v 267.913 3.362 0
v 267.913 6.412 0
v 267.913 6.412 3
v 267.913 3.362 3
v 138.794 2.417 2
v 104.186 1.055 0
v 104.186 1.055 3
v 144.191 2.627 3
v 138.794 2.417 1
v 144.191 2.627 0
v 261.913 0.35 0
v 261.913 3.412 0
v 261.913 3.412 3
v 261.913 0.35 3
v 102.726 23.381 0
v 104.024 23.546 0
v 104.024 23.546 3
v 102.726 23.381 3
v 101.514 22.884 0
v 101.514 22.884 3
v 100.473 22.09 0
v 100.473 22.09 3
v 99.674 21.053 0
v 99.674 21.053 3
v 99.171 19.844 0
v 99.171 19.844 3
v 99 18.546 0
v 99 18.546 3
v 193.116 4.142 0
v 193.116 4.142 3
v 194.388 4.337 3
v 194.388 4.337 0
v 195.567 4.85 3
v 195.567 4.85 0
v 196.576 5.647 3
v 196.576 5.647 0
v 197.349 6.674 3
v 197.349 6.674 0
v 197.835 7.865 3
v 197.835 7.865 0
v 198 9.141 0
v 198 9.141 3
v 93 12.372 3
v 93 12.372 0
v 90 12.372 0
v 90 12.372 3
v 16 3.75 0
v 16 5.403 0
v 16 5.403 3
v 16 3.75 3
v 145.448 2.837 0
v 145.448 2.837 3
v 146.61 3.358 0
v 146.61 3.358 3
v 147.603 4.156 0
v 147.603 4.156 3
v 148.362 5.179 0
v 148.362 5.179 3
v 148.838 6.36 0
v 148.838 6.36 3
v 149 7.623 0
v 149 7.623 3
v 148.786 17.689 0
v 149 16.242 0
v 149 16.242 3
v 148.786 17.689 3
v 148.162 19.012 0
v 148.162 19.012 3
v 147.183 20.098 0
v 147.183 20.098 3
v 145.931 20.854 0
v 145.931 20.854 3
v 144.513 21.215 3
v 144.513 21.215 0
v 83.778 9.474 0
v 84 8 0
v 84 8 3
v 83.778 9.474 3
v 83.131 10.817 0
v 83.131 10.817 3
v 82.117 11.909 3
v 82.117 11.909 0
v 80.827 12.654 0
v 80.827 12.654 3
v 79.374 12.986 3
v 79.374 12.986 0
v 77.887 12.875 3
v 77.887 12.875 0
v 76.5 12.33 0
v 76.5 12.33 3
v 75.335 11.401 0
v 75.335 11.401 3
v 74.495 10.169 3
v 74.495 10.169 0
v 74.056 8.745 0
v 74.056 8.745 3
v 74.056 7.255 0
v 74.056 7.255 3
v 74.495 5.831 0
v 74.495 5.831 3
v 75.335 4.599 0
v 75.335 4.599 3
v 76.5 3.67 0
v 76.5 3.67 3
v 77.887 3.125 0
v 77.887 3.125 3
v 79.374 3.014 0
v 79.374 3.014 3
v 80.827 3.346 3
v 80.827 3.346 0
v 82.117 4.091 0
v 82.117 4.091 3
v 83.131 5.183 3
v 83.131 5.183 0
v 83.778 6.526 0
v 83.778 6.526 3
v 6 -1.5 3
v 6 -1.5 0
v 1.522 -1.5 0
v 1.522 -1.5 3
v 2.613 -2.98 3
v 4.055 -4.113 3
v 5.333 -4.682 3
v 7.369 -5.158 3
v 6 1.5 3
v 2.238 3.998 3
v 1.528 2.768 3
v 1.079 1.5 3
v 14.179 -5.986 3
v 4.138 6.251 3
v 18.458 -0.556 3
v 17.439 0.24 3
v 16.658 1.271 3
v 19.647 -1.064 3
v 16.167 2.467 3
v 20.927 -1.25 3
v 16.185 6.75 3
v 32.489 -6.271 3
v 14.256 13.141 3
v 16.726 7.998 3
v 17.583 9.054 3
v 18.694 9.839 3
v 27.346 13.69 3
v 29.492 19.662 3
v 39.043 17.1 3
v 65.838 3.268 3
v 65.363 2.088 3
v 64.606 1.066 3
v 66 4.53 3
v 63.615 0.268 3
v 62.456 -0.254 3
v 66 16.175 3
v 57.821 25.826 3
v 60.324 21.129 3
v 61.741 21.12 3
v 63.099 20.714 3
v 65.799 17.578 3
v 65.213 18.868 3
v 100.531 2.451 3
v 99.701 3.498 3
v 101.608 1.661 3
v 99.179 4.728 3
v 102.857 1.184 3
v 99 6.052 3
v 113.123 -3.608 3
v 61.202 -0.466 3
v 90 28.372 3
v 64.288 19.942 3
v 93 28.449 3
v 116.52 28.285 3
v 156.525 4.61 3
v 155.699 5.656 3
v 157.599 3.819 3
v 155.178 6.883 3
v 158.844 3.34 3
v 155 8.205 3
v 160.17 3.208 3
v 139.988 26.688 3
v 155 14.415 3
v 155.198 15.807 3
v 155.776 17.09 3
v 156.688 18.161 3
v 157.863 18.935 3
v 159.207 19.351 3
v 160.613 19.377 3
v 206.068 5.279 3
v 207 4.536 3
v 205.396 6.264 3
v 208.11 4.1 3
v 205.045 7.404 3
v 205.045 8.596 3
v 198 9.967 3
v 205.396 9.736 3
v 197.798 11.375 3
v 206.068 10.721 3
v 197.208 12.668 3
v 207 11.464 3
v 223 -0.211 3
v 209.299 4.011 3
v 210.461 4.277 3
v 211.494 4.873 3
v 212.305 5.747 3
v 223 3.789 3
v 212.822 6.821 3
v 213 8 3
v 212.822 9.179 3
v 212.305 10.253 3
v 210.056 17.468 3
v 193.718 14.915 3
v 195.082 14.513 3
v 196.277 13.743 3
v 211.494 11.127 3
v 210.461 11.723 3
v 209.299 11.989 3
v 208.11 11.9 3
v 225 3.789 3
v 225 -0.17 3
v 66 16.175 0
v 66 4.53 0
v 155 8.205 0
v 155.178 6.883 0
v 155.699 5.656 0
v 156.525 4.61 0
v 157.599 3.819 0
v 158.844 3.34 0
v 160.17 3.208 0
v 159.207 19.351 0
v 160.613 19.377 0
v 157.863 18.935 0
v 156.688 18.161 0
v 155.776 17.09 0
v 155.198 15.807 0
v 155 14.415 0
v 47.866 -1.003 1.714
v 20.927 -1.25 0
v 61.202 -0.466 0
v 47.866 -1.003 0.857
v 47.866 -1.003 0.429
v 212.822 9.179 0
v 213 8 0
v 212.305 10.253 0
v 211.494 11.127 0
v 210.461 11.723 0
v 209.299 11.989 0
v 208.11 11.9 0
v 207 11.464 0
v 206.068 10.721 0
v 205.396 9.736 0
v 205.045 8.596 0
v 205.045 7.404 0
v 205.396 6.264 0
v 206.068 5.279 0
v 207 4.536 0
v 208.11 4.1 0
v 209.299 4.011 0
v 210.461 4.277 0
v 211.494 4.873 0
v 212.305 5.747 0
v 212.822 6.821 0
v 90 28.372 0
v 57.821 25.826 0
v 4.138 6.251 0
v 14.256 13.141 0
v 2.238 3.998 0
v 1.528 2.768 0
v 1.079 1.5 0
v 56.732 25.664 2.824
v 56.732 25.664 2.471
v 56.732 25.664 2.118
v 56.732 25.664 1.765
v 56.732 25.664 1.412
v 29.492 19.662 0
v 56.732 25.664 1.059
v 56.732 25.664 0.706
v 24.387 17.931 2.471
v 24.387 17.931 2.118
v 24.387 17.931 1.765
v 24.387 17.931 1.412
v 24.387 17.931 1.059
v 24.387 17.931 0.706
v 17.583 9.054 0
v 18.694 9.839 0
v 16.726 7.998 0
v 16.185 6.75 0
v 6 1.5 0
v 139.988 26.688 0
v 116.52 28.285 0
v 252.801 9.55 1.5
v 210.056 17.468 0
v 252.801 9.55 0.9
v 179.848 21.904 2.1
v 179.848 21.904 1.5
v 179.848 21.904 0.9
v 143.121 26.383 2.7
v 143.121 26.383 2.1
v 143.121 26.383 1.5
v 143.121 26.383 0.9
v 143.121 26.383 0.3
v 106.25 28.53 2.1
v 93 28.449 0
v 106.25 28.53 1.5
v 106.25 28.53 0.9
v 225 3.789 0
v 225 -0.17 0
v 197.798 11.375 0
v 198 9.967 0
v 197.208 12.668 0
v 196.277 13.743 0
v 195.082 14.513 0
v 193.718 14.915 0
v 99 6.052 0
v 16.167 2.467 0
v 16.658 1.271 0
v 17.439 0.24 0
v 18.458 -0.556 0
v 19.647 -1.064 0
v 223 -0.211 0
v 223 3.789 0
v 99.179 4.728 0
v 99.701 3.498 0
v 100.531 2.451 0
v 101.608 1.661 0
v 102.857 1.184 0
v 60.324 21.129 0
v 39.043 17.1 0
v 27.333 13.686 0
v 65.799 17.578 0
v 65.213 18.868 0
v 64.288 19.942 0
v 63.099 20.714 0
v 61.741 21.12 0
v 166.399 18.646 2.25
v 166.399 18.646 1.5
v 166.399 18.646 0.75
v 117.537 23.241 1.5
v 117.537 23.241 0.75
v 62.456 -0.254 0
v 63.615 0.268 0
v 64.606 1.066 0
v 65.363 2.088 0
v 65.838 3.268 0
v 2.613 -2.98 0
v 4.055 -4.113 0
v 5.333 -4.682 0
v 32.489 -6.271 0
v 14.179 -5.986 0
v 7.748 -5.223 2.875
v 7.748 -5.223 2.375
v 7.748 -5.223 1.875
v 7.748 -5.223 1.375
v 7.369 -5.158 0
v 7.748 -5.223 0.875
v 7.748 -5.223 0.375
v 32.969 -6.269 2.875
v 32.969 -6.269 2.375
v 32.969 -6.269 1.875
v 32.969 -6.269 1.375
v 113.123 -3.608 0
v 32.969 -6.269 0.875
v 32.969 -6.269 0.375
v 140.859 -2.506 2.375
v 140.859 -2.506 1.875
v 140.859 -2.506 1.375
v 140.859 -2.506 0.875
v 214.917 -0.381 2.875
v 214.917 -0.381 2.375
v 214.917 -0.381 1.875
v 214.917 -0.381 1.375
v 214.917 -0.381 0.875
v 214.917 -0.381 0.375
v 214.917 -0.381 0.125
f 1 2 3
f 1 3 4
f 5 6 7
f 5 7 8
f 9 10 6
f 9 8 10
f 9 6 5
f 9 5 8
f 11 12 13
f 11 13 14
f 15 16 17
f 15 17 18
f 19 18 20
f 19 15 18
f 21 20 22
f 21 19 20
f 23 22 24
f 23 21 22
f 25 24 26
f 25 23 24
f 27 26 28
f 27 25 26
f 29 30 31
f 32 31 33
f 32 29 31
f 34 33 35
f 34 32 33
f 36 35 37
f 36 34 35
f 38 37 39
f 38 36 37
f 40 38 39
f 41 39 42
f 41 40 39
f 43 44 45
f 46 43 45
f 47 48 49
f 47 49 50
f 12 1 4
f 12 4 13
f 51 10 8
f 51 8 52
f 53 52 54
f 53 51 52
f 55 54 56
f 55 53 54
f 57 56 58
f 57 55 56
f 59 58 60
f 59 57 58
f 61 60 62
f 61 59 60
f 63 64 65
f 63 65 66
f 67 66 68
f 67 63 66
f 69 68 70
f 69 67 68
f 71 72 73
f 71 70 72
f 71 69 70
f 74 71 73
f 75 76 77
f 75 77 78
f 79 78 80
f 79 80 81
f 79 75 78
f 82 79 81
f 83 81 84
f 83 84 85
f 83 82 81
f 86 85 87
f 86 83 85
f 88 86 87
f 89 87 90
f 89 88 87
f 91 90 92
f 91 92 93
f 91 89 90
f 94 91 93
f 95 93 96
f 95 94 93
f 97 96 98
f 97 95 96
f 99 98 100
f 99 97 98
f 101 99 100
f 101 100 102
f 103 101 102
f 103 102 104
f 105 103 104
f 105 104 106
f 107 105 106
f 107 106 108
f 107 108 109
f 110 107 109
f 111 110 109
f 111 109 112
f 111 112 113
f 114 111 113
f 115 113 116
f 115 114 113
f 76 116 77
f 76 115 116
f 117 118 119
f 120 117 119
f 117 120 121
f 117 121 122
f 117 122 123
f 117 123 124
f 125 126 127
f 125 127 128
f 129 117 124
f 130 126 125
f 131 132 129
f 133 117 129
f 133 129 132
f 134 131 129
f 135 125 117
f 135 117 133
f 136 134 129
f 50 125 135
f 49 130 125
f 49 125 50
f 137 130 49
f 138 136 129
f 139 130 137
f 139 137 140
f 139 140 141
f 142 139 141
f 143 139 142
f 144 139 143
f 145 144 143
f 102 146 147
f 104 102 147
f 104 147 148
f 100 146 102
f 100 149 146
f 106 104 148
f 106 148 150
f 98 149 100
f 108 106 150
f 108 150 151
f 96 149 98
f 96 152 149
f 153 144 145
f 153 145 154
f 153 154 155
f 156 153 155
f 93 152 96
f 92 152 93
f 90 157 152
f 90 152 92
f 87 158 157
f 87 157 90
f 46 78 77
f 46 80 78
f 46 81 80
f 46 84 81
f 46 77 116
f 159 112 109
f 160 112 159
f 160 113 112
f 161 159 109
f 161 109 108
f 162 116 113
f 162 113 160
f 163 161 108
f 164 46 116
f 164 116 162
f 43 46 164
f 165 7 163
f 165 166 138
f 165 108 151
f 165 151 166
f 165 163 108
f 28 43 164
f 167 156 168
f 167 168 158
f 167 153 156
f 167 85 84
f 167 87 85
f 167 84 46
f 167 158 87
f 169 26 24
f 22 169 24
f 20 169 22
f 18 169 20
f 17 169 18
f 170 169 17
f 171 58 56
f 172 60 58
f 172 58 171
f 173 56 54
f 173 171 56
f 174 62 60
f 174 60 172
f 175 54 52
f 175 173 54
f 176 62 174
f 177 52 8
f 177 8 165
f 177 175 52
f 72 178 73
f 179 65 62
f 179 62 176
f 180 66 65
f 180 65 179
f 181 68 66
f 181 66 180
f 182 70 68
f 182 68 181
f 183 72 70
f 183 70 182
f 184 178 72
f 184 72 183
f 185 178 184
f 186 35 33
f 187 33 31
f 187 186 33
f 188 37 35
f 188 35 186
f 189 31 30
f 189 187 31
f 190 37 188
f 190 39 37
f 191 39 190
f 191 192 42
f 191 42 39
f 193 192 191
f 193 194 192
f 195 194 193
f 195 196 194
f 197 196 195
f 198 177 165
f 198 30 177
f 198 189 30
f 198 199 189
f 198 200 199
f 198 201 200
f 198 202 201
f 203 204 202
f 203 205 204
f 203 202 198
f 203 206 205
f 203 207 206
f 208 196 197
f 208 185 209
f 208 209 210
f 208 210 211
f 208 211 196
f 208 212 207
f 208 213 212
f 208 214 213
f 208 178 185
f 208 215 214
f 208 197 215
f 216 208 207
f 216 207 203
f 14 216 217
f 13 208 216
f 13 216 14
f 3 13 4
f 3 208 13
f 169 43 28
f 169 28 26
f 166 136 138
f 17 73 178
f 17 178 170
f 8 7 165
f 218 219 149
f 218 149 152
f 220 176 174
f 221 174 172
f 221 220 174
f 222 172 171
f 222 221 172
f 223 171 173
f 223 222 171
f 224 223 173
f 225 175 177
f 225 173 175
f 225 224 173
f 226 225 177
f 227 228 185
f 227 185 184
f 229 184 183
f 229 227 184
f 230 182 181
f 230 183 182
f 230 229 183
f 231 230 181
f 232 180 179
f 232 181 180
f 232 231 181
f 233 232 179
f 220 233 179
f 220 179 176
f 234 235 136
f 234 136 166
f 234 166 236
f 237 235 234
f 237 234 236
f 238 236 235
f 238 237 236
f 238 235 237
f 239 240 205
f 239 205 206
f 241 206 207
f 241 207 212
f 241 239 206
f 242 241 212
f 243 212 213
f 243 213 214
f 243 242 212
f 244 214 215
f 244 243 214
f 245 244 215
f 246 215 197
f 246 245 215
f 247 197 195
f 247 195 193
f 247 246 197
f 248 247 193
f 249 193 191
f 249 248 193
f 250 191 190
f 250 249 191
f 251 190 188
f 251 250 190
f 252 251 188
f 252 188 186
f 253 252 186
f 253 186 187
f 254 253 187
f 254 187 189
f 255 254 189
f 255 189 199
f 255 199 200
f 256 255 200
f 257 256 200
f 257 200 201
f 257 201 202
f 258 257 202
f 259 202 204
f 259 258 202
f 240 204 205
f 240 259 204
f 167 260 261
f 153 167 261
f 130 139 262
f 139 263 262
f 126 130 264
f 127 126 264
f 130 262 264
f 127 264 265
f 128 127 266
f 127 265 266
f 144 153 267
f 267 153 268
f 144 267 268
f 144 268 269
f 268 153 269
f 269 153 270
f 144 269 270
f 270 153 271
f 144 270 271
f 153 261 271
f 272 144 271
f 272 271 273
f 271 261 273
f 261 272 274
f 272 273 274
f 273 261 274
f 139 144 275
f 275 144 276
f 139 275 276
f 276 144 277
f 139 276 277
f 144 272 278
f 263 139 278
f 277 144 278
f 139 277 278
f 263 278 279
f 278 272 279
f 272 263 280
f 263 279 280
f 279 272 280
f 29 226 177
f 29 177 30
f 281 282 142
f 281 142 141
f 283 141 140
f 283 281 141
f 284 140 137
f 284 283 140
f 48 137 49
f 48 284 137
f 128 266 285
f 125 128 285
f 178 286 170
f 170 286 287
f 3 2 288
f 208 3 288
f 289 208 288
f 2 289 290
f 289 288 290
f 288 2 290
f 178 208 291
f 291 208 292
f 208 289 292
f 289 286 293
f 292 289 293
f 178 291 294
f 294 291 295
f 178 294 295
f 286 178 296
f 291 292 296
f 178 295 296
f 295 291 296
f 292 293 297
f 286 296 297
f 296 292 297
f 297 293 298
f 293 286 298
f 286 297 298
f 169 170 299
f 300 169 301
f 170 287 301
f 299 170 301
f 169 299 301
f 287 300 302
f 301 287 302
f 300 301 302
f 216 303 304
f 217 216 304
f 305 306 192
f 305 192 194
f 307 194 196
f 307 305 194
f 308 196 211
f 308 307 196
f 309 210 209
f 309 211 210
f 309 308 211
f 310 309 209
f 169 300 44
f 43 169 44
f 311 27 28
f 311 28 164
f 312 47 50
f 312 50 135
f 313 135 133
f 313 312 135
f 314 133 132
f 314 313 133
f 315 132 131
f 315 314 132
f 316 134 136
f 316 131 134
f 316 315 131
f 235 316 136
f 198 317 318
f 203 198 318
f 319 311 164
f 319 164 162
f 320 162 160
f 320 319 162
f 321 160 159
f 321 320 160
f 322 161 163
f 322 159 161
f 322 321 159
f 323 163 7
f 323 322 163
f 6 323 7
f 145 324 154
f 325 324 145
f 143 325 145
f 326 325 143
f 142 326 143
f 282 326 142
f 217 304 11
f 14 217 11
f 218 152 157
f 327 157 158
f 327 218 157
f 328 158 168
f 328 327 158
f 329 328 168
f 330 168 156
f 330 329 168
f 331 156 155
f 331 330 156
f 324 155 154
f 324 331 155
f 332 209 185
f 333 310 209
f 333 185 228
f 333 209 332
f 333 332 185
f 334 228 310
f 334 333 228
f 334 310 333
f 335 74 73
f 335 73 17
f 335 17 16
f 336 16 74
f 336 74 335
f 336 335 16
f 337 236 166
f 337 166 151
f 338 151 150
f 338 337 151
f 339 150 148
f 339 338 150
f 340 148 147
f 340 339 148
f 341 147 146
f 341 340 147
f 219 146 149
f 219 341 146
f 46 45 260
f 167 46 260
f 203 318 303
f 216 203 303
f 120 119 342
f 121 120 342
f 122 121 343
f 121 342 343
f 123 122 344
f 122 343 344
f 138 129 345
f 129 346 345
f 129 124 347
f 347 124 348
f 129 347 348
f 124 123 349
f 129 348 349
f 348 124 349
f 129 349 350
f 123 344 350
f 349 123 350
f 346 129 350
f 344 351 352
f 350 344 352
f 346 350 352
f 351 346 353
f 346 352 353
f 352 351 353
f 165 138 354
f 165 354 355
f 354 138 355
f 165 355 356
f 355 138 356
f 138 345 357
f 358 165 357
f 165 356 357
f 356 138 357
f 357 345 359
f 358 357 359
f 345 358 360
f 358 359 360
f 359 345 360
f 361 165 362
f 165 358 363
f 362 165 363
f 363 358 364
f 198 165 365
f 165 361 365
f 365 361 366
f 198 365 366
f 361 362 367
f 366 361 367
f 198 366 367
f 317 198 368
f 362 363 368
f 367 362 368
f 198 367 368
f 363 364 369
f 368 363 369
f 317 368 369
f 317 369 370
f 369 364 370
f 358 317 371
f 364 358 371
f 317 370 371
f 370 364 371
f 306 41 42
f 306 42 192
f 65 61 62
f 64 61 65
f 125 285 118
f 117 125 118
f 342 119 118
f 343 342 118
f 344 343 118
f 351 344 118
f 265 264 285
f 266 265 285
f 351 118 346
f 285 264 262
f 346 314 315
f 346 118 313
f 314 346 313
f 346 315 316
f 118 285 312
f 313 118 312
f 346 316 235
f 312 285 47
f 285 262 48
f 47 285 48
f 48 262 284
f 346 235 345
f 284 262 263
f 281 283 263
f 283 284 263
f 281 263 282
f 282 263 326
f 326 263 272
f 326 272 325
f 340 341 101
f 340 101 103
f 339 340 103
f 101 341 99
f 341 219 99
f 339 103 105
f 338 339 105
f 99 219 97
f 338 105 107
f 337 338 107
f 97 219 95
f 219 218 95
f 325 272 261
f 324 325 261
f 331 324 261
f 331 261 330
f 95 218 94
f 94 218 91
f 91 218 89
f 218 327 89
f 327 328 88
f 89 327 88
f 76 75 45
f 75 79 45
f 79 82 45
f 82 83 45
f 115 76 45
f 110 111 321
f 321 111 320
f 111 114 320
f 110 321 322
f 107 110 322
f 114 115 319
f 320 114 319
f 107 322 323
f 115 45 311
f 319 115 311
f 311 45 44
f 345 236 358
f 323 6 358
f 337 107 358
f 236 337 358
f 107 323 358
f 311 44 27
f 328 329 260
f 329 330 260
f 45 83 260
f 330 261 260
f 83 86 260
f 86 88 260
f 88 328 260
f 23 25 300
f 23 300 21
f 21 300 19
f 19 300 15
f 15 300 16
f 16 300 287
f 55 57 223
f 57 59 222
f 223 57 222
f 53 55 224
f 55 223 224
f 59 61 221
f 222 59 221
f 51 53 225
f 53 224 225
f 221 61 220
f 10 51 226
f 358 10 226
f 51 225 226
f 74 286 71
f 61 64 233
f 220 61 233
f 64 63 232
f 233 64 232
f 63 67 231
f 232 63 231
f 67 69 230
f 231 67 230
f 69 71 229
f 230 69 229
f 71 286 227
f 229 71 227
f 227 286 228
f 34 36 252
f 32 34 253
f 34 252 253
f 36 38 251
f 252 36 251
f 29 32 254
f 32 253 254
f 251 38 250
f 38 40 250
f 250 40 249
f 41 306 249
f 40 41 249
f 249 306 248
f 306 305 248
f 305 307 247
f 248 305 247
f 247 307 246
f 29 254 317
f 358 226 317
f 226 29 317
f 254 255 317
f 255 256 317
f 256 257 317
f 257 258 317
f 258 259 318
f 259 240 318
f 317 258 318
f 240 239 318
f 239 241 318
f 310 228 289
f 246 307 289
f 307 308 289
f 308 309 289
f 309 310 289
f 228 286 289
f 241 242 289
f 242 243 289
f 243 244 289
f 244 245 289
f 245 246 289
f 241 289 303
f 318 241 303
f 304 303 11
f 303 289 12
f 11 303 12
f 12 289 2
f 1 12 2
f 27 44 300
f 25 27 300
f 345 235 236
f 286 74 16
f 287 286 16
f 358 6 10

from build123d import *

# Parameters (mm, degrees)
SKETCH_1_R          = 5
SKETCH_1_R_2        = 4
EXTRUDE_1_DEPTH     = 3
CUT_EXTRUDE_2_DEPTH = 291.422386836


with BuildPart() as part:
    # 草图1 → 凸台-拉伸1 (new body)
    with BuildSketch(Plane.XY):
        with BuildLine():
            Line((90, 12.3715), (90, 28.372426217))
            add(Edge.make_bspline(
                [(90, 28.372426217), (89.259446982, 28.350928743), (82.363996343, 28.13322439), (72.403347361, 27.586524792), (60.185862052, 26.226268085), (51.080991088, 24.79810862), (42.033943524, 23.000087944), (34.581994337, 21.174922903), (28.697351661, 19.44563851), (24.361981086, 17.983441115), (20.174828998, 16.207949367), (16.078941989, 14.139912989), (12.040296713, 11.946766626), (8.14011433, 9.56039573), (5.153679337, 7.316395724), (3.100060439, 5.200618052), (1.813825976, 3.470730924), (1.237398467, 2.180506339), (1.085380705, 1.529058937), (1.078882286, 1.5)],
                knots=[0.345773533, 0.345773533, 0.345773533, 0.345773533, 0.349398211, 0.379527288, 0.394591827, 0.409656366, 0.424720905, 0.439785444, 0.447317713, 0.454849983, 0.462382252, 0.469914522, 0.477446791, 0.484979061, 0.49251133, 0.496277465, 0.5000436, 0.503809734, 0.503985678, 0.503985678, 0.503985678, 0.503985678], degree=3))
            Line((1.078882286, 1.5), (6, 1.5))
            Line((6, 1.5), (6, -1.5))
            Line((6, -1.5), (1.522379628, -1.5))
            add(Edge.make_bspline(
                [(1.522379628, -1.5), (1.617903461, -1.678770523), (2.068186491, -2.42442122), (3.143139608, -3.601090845), (4.854253, -4.619355756), (6.927567017, -5.105597911), (9.209034621, -5.454839075), (12.219971865, -5.84289763), (16.020132359, -6.14266222), (20.609524976, -6.2611368), (25.231457517, -6.286948592), (31.397380169, -6.280305851), (39.107274969, -6.240736398), (48.336813051, -6.022096429), (57.579935967, -5.612990736), (66.840654471, -5.242934226), (76.096556555, -4.921715721), (88.435998513, -4.515955408), (103.853120896, -3.973102953), (122.354625015, -3.248110744), (140.857835973, -2.495489966), (159.368527813, -1.804089638), (177.884173919, -1.222493213), (196.4033921, -0.774877257), (211.439290174, -0.454334834), (220.305576898, -0.265987383), (223, -0.210849605)],
                knots=[0.510182255, 0.510182255, 0.510182255, 0.510182255, 0.511342004, 0.515108139, 0.518874273, 0.522640408, 0.526406543, 0.530172677, 0.537704947, 0.545237216, 0.552769486, 0.560301755, 0.575366294, 0.590430833, 0.605495372, 0.620559911, 0.63562445, 0.650688989, 0.680818067, 0.710947144, 0.741076222, 0.7712053, 0.801334378, 0.831463456, 0.861592533, 0.874744372, 0.874744372, 0.874744372, 0.874744372], degree=3))
            Line((223, -0.210849605), (223, 3.788737263))
            Line((223, 3.788737263), (225, 3.788737263))
            Line((225, 3.788737263), (225, -0.170338801))
            add(Edge.make_bspline(
                [(225, -0.170338801), (227.811595191, -0.114017747), (236.796798206, 0.056910764), (251.961175933, 0.256656825), (270.471854229, 0.429163033), (282.824771355, 0.587434741), (289, 0.610062865)],
                knots=[0.877998396, 0.877998396, 0.877998396, 0.877998396, 0.891721611, 0.921850689, 0.951979767, 0.982108845, 0.982108845, 0.982108845, 0.982108845], degree=3))
            Line((289, 0.610062865), (289, 1.816246039))
            add(Edge.make_bspline(
                [(289, 1.816246039), (276.957314444, 4.502285023), (258.861554155, 8.397620333), (234.648247971, 13.152786595), (216.448478593, 16.478914183), (198.182873559, 19.371550405), (179.850571346, 21.924148488), (161.503162682, 24.358614825), (143.127892269, 26.473190985), (124.712239059, 28.043780086), (107.994173705, 28.616385423), (97.416270032, 28.546670082), (93, 28.44913561)],
                knots=[0.017978355, 0.017978355, 0.017978355, 0.017978355, 0.07823651, 0.108365588, 0.138494666, 0.168623744, 0.198752821, 0.228881899, 0.259010977, 0.289140055, 0.319269133, 0.340879606, 0.340879606, 0.340879606, 0.340879606], degree=3))
            Line((93, 28.44913561), (93, 12.3715))
            Line((93, 12.3715), (90, 12.3715))
        make_face()
        with Locations((79, 8)):
            Circle(SKETCH_1_R, mode=Mode.SUBTRACT)
        with Locations((209, 8)):
            Circle(SKETCH_1_R_2, mode=Mode.SUBTRACT)
    extrude(amount=EXTRUDE_1_DEPTH)

    # 草图3 → 切除-拉伸2 (cut, through all)
    with BuildSketch(Plane.XY):
        Polygon((261.913052859, 3.412186808), (261.913052859, 0.349901395), (296.913052859, 0.349901395), (267.913052859, 6.412186808), (267.913052859, 3.362186808), align=None)
        with BuildLine():
            Line((16, 5.402967421), (16, 3.749585631))
            ThreePointArc((16, 3.749585631), (17.438635496, 0.240072435), (20.926673148, -1.249876658))
            add(Edge.make_bspline(
                [(20.926673148, -1.249876658), (21.809693827, -1.262827876), (22.70041751, -1.270722289), (24.744752026, -1.282014543), (25.903390676, -1.283802206), (29.38108188, -1.283541675), (31.709604831, -1.277171959), (36.343989553, -1.248263334), (38.652190318, -1.223511787), (43.261210505, -1.138923387), (45.563329713, -1.080117385), (50.168153725, -0.92677743), (52.481550313, -0.831144642), (56.932408226, -0.642663317), (59.067384966, -0.552312083), (61.20153145, -0.466222597)],
                knots=[0.097228806, 0.097228806, 0.097228806, 0.097228806, 0.109375, 0.109375, 0.125, 0.125, 0.15625, 0.15625, 0.1875, 0.1875, 0.21875, 0.21875, 0.25, 0.25, 0.27850067, 0.27850067, 0.27850067, 0.27850067], degree=3))
            ThreePointArc((61.20153145, -0.466222597), (64.606082171, 1.066165303), (66, 4.529714259))
            Line((66, 4.529714259), (66, 16.175207171))
            ThreePointArc((66, 16.175207171), (64.287676463, 19.942325894), (60.32352661, 21.129234195))
            add(Edge.make_bspline(
                [(60.32352661, 21.129234195), (59.143282742, 20.968071656), (57.964431768, 20.796736398), (53.109249428, 20.046773379), (49.445857595, 19.384253181), (42.158673028, 17.868714577), (38.533379611, 17.019586343), (33.148990447, 15.546220745), (31.362942012, 15.022439399), (27.821005995, 13.880218625), (26.067238608, 13.253271835), (22.635818059, 11.812670552), (20.957942753, 11.004847704), (19.099592195, 10.049689097), (18.896441621, 9.944700093), (18.693547477, 9.839213217)],
                knots=[0.029920383, 0.029920383, 0.029920383, 0.029920383, 0.033494004, 0.033494004, 0.044658672, 0.044658672, 0.05582334, 0.05582334, 0.061405674, 0.061405674, 0.066988008, 0.066988008, 0.072570342, 0.072570342, 0.073256353, 0.073256353, 0.073256353, 0.073256353], degree=3))
            ThreePointArc((18.693547477, 9.839213217), (16.726110517, 7.997937304), (16, 5.402967421))
        make_face()
        with BuildLine():
            Line((99, 18.545958183), (99, 6.051698891))
            ThreePointArc((99, 6.051698891), (100.530987404, 2.450872374), (104.186380643, 1.055173873))
            add(Edge.make_bspline(
                [(104.186380643, 1.055173873), (106.39458867, 1.137544567), (108.602901821, 1.221357381), (120.131865001, 1.665786726), (129.456324286, 2.050051394), (140.592579239, 2.48797418), (142.3918285, 2.557905459), (144.191396926, 2.626842357)],
                knots=[0.470377348, 0.470377348, 0.470377348, 0.470377348, 0.5, 0.5, 0.625, 0.625, 0.649081852, 0.649081852, 0.649081852, 0.649081852], degree=3))
            ThreePointArc((144.191396926, 2.626842357), (147.602567462, 4.155973144), (149, 7.623177736))
            Line((149, 7.623177736), (149, 16.241622969))
            ThreePointArc((149, 16.241622969), (147.712532938, 19.59081678), (144.513160327, 21.215219904))
            add(Edge.make_bspline(
                [(144.513160327, 21.215219904), (143.652145828, 21.304056714), (142.791222193, 21.391146352), (137.856440927, 21.879784463), (133.787425472, 22.240923522), (125.659256001, 22.840362063), (121.601588339, 23.075546461), (113.037568805, 23.424275072), (108.53263967, 23.523953165), (104.024339014, 23.545898944)],
                knots=[0.736793621, 0.736793621, 0.736793621, 0.736793621, 0.75, 0.75, 0.8125, 0.8125, 0.875, 0.875, 0.944193059, 0.944193059, 0.944193059, 0.944193059], degree=3))
            ThreePointArc((104.024339014, 23.545898944), (100.473081733, 22.090086783), (99, 18.545958183))
        make_face()
        with BuildLine():
            Line((155, 14.41455393), (155, 8.204846233))
            ThreePointArc((155, 8.204846233), (156.525241738, 4.609563904), (160.17042201, 3.207751443))
            add(Edge.make_bspline(
                [(160.17042201, 3.207751443), (162.389721662, 3.283438922), (164.609319497, 3.356780918), (171.504636491, 3.576232826), (176.18199895, 3.713351663), (184.945921303, 3.946800138), (189.03214497, 4.046860263), (193.116453453, 4.14201244)],
                knots=[0.720326449, 0.720326449, 0.720326449, 0.720326449, 0.75, 0.75, 0.8125, 0.8125, 0.867133534, 0.867133534, 0.867133534, 0.867133534], degree=3))
            ThreePointArc((193.116453453, 4.14201244), (196.576469437, 5.64653729), (198, 9.140656115))
            Line((198, 9.140656115), (198, 9.967295711))
            ThreePointArc((198, 9.967295711), (196.781019979, 13.238975389), (193.718444833, 14.915410202))
            add(Edge.make_bspline(
                [(193.718444833, 14.915410202), (192.779013077, 15.051811632), (191.839123333, 15.187073825), (186.824226186, 15.902901834), (182.740892869, 16.465870736), (174.565909682, 17.575800313), (170.481299177, 18.120965891), (164.469973656, 18.894543341), (162.541485429, 19.138417507), (160.613475955, 19.376775938)],
                knots=[0.485575284, 0.485575284, 0.485575284, 0.485575284, 0.5, 0.5, 0.5625, 0.5625, 0.625, 0.625, 0.654532252, 0.654532252, 0.654532252, 0.654532252], degree=3))
            ThreePointArc((160.613475955, 19.376775938), (156.688458046, 18.160710613), (155, 14.41455393))
        make_face()
    extrude(amount=CUT_EXTRUDE_2_DEPTH, mode=Mode.SUBTRACT)


solid = part.part
